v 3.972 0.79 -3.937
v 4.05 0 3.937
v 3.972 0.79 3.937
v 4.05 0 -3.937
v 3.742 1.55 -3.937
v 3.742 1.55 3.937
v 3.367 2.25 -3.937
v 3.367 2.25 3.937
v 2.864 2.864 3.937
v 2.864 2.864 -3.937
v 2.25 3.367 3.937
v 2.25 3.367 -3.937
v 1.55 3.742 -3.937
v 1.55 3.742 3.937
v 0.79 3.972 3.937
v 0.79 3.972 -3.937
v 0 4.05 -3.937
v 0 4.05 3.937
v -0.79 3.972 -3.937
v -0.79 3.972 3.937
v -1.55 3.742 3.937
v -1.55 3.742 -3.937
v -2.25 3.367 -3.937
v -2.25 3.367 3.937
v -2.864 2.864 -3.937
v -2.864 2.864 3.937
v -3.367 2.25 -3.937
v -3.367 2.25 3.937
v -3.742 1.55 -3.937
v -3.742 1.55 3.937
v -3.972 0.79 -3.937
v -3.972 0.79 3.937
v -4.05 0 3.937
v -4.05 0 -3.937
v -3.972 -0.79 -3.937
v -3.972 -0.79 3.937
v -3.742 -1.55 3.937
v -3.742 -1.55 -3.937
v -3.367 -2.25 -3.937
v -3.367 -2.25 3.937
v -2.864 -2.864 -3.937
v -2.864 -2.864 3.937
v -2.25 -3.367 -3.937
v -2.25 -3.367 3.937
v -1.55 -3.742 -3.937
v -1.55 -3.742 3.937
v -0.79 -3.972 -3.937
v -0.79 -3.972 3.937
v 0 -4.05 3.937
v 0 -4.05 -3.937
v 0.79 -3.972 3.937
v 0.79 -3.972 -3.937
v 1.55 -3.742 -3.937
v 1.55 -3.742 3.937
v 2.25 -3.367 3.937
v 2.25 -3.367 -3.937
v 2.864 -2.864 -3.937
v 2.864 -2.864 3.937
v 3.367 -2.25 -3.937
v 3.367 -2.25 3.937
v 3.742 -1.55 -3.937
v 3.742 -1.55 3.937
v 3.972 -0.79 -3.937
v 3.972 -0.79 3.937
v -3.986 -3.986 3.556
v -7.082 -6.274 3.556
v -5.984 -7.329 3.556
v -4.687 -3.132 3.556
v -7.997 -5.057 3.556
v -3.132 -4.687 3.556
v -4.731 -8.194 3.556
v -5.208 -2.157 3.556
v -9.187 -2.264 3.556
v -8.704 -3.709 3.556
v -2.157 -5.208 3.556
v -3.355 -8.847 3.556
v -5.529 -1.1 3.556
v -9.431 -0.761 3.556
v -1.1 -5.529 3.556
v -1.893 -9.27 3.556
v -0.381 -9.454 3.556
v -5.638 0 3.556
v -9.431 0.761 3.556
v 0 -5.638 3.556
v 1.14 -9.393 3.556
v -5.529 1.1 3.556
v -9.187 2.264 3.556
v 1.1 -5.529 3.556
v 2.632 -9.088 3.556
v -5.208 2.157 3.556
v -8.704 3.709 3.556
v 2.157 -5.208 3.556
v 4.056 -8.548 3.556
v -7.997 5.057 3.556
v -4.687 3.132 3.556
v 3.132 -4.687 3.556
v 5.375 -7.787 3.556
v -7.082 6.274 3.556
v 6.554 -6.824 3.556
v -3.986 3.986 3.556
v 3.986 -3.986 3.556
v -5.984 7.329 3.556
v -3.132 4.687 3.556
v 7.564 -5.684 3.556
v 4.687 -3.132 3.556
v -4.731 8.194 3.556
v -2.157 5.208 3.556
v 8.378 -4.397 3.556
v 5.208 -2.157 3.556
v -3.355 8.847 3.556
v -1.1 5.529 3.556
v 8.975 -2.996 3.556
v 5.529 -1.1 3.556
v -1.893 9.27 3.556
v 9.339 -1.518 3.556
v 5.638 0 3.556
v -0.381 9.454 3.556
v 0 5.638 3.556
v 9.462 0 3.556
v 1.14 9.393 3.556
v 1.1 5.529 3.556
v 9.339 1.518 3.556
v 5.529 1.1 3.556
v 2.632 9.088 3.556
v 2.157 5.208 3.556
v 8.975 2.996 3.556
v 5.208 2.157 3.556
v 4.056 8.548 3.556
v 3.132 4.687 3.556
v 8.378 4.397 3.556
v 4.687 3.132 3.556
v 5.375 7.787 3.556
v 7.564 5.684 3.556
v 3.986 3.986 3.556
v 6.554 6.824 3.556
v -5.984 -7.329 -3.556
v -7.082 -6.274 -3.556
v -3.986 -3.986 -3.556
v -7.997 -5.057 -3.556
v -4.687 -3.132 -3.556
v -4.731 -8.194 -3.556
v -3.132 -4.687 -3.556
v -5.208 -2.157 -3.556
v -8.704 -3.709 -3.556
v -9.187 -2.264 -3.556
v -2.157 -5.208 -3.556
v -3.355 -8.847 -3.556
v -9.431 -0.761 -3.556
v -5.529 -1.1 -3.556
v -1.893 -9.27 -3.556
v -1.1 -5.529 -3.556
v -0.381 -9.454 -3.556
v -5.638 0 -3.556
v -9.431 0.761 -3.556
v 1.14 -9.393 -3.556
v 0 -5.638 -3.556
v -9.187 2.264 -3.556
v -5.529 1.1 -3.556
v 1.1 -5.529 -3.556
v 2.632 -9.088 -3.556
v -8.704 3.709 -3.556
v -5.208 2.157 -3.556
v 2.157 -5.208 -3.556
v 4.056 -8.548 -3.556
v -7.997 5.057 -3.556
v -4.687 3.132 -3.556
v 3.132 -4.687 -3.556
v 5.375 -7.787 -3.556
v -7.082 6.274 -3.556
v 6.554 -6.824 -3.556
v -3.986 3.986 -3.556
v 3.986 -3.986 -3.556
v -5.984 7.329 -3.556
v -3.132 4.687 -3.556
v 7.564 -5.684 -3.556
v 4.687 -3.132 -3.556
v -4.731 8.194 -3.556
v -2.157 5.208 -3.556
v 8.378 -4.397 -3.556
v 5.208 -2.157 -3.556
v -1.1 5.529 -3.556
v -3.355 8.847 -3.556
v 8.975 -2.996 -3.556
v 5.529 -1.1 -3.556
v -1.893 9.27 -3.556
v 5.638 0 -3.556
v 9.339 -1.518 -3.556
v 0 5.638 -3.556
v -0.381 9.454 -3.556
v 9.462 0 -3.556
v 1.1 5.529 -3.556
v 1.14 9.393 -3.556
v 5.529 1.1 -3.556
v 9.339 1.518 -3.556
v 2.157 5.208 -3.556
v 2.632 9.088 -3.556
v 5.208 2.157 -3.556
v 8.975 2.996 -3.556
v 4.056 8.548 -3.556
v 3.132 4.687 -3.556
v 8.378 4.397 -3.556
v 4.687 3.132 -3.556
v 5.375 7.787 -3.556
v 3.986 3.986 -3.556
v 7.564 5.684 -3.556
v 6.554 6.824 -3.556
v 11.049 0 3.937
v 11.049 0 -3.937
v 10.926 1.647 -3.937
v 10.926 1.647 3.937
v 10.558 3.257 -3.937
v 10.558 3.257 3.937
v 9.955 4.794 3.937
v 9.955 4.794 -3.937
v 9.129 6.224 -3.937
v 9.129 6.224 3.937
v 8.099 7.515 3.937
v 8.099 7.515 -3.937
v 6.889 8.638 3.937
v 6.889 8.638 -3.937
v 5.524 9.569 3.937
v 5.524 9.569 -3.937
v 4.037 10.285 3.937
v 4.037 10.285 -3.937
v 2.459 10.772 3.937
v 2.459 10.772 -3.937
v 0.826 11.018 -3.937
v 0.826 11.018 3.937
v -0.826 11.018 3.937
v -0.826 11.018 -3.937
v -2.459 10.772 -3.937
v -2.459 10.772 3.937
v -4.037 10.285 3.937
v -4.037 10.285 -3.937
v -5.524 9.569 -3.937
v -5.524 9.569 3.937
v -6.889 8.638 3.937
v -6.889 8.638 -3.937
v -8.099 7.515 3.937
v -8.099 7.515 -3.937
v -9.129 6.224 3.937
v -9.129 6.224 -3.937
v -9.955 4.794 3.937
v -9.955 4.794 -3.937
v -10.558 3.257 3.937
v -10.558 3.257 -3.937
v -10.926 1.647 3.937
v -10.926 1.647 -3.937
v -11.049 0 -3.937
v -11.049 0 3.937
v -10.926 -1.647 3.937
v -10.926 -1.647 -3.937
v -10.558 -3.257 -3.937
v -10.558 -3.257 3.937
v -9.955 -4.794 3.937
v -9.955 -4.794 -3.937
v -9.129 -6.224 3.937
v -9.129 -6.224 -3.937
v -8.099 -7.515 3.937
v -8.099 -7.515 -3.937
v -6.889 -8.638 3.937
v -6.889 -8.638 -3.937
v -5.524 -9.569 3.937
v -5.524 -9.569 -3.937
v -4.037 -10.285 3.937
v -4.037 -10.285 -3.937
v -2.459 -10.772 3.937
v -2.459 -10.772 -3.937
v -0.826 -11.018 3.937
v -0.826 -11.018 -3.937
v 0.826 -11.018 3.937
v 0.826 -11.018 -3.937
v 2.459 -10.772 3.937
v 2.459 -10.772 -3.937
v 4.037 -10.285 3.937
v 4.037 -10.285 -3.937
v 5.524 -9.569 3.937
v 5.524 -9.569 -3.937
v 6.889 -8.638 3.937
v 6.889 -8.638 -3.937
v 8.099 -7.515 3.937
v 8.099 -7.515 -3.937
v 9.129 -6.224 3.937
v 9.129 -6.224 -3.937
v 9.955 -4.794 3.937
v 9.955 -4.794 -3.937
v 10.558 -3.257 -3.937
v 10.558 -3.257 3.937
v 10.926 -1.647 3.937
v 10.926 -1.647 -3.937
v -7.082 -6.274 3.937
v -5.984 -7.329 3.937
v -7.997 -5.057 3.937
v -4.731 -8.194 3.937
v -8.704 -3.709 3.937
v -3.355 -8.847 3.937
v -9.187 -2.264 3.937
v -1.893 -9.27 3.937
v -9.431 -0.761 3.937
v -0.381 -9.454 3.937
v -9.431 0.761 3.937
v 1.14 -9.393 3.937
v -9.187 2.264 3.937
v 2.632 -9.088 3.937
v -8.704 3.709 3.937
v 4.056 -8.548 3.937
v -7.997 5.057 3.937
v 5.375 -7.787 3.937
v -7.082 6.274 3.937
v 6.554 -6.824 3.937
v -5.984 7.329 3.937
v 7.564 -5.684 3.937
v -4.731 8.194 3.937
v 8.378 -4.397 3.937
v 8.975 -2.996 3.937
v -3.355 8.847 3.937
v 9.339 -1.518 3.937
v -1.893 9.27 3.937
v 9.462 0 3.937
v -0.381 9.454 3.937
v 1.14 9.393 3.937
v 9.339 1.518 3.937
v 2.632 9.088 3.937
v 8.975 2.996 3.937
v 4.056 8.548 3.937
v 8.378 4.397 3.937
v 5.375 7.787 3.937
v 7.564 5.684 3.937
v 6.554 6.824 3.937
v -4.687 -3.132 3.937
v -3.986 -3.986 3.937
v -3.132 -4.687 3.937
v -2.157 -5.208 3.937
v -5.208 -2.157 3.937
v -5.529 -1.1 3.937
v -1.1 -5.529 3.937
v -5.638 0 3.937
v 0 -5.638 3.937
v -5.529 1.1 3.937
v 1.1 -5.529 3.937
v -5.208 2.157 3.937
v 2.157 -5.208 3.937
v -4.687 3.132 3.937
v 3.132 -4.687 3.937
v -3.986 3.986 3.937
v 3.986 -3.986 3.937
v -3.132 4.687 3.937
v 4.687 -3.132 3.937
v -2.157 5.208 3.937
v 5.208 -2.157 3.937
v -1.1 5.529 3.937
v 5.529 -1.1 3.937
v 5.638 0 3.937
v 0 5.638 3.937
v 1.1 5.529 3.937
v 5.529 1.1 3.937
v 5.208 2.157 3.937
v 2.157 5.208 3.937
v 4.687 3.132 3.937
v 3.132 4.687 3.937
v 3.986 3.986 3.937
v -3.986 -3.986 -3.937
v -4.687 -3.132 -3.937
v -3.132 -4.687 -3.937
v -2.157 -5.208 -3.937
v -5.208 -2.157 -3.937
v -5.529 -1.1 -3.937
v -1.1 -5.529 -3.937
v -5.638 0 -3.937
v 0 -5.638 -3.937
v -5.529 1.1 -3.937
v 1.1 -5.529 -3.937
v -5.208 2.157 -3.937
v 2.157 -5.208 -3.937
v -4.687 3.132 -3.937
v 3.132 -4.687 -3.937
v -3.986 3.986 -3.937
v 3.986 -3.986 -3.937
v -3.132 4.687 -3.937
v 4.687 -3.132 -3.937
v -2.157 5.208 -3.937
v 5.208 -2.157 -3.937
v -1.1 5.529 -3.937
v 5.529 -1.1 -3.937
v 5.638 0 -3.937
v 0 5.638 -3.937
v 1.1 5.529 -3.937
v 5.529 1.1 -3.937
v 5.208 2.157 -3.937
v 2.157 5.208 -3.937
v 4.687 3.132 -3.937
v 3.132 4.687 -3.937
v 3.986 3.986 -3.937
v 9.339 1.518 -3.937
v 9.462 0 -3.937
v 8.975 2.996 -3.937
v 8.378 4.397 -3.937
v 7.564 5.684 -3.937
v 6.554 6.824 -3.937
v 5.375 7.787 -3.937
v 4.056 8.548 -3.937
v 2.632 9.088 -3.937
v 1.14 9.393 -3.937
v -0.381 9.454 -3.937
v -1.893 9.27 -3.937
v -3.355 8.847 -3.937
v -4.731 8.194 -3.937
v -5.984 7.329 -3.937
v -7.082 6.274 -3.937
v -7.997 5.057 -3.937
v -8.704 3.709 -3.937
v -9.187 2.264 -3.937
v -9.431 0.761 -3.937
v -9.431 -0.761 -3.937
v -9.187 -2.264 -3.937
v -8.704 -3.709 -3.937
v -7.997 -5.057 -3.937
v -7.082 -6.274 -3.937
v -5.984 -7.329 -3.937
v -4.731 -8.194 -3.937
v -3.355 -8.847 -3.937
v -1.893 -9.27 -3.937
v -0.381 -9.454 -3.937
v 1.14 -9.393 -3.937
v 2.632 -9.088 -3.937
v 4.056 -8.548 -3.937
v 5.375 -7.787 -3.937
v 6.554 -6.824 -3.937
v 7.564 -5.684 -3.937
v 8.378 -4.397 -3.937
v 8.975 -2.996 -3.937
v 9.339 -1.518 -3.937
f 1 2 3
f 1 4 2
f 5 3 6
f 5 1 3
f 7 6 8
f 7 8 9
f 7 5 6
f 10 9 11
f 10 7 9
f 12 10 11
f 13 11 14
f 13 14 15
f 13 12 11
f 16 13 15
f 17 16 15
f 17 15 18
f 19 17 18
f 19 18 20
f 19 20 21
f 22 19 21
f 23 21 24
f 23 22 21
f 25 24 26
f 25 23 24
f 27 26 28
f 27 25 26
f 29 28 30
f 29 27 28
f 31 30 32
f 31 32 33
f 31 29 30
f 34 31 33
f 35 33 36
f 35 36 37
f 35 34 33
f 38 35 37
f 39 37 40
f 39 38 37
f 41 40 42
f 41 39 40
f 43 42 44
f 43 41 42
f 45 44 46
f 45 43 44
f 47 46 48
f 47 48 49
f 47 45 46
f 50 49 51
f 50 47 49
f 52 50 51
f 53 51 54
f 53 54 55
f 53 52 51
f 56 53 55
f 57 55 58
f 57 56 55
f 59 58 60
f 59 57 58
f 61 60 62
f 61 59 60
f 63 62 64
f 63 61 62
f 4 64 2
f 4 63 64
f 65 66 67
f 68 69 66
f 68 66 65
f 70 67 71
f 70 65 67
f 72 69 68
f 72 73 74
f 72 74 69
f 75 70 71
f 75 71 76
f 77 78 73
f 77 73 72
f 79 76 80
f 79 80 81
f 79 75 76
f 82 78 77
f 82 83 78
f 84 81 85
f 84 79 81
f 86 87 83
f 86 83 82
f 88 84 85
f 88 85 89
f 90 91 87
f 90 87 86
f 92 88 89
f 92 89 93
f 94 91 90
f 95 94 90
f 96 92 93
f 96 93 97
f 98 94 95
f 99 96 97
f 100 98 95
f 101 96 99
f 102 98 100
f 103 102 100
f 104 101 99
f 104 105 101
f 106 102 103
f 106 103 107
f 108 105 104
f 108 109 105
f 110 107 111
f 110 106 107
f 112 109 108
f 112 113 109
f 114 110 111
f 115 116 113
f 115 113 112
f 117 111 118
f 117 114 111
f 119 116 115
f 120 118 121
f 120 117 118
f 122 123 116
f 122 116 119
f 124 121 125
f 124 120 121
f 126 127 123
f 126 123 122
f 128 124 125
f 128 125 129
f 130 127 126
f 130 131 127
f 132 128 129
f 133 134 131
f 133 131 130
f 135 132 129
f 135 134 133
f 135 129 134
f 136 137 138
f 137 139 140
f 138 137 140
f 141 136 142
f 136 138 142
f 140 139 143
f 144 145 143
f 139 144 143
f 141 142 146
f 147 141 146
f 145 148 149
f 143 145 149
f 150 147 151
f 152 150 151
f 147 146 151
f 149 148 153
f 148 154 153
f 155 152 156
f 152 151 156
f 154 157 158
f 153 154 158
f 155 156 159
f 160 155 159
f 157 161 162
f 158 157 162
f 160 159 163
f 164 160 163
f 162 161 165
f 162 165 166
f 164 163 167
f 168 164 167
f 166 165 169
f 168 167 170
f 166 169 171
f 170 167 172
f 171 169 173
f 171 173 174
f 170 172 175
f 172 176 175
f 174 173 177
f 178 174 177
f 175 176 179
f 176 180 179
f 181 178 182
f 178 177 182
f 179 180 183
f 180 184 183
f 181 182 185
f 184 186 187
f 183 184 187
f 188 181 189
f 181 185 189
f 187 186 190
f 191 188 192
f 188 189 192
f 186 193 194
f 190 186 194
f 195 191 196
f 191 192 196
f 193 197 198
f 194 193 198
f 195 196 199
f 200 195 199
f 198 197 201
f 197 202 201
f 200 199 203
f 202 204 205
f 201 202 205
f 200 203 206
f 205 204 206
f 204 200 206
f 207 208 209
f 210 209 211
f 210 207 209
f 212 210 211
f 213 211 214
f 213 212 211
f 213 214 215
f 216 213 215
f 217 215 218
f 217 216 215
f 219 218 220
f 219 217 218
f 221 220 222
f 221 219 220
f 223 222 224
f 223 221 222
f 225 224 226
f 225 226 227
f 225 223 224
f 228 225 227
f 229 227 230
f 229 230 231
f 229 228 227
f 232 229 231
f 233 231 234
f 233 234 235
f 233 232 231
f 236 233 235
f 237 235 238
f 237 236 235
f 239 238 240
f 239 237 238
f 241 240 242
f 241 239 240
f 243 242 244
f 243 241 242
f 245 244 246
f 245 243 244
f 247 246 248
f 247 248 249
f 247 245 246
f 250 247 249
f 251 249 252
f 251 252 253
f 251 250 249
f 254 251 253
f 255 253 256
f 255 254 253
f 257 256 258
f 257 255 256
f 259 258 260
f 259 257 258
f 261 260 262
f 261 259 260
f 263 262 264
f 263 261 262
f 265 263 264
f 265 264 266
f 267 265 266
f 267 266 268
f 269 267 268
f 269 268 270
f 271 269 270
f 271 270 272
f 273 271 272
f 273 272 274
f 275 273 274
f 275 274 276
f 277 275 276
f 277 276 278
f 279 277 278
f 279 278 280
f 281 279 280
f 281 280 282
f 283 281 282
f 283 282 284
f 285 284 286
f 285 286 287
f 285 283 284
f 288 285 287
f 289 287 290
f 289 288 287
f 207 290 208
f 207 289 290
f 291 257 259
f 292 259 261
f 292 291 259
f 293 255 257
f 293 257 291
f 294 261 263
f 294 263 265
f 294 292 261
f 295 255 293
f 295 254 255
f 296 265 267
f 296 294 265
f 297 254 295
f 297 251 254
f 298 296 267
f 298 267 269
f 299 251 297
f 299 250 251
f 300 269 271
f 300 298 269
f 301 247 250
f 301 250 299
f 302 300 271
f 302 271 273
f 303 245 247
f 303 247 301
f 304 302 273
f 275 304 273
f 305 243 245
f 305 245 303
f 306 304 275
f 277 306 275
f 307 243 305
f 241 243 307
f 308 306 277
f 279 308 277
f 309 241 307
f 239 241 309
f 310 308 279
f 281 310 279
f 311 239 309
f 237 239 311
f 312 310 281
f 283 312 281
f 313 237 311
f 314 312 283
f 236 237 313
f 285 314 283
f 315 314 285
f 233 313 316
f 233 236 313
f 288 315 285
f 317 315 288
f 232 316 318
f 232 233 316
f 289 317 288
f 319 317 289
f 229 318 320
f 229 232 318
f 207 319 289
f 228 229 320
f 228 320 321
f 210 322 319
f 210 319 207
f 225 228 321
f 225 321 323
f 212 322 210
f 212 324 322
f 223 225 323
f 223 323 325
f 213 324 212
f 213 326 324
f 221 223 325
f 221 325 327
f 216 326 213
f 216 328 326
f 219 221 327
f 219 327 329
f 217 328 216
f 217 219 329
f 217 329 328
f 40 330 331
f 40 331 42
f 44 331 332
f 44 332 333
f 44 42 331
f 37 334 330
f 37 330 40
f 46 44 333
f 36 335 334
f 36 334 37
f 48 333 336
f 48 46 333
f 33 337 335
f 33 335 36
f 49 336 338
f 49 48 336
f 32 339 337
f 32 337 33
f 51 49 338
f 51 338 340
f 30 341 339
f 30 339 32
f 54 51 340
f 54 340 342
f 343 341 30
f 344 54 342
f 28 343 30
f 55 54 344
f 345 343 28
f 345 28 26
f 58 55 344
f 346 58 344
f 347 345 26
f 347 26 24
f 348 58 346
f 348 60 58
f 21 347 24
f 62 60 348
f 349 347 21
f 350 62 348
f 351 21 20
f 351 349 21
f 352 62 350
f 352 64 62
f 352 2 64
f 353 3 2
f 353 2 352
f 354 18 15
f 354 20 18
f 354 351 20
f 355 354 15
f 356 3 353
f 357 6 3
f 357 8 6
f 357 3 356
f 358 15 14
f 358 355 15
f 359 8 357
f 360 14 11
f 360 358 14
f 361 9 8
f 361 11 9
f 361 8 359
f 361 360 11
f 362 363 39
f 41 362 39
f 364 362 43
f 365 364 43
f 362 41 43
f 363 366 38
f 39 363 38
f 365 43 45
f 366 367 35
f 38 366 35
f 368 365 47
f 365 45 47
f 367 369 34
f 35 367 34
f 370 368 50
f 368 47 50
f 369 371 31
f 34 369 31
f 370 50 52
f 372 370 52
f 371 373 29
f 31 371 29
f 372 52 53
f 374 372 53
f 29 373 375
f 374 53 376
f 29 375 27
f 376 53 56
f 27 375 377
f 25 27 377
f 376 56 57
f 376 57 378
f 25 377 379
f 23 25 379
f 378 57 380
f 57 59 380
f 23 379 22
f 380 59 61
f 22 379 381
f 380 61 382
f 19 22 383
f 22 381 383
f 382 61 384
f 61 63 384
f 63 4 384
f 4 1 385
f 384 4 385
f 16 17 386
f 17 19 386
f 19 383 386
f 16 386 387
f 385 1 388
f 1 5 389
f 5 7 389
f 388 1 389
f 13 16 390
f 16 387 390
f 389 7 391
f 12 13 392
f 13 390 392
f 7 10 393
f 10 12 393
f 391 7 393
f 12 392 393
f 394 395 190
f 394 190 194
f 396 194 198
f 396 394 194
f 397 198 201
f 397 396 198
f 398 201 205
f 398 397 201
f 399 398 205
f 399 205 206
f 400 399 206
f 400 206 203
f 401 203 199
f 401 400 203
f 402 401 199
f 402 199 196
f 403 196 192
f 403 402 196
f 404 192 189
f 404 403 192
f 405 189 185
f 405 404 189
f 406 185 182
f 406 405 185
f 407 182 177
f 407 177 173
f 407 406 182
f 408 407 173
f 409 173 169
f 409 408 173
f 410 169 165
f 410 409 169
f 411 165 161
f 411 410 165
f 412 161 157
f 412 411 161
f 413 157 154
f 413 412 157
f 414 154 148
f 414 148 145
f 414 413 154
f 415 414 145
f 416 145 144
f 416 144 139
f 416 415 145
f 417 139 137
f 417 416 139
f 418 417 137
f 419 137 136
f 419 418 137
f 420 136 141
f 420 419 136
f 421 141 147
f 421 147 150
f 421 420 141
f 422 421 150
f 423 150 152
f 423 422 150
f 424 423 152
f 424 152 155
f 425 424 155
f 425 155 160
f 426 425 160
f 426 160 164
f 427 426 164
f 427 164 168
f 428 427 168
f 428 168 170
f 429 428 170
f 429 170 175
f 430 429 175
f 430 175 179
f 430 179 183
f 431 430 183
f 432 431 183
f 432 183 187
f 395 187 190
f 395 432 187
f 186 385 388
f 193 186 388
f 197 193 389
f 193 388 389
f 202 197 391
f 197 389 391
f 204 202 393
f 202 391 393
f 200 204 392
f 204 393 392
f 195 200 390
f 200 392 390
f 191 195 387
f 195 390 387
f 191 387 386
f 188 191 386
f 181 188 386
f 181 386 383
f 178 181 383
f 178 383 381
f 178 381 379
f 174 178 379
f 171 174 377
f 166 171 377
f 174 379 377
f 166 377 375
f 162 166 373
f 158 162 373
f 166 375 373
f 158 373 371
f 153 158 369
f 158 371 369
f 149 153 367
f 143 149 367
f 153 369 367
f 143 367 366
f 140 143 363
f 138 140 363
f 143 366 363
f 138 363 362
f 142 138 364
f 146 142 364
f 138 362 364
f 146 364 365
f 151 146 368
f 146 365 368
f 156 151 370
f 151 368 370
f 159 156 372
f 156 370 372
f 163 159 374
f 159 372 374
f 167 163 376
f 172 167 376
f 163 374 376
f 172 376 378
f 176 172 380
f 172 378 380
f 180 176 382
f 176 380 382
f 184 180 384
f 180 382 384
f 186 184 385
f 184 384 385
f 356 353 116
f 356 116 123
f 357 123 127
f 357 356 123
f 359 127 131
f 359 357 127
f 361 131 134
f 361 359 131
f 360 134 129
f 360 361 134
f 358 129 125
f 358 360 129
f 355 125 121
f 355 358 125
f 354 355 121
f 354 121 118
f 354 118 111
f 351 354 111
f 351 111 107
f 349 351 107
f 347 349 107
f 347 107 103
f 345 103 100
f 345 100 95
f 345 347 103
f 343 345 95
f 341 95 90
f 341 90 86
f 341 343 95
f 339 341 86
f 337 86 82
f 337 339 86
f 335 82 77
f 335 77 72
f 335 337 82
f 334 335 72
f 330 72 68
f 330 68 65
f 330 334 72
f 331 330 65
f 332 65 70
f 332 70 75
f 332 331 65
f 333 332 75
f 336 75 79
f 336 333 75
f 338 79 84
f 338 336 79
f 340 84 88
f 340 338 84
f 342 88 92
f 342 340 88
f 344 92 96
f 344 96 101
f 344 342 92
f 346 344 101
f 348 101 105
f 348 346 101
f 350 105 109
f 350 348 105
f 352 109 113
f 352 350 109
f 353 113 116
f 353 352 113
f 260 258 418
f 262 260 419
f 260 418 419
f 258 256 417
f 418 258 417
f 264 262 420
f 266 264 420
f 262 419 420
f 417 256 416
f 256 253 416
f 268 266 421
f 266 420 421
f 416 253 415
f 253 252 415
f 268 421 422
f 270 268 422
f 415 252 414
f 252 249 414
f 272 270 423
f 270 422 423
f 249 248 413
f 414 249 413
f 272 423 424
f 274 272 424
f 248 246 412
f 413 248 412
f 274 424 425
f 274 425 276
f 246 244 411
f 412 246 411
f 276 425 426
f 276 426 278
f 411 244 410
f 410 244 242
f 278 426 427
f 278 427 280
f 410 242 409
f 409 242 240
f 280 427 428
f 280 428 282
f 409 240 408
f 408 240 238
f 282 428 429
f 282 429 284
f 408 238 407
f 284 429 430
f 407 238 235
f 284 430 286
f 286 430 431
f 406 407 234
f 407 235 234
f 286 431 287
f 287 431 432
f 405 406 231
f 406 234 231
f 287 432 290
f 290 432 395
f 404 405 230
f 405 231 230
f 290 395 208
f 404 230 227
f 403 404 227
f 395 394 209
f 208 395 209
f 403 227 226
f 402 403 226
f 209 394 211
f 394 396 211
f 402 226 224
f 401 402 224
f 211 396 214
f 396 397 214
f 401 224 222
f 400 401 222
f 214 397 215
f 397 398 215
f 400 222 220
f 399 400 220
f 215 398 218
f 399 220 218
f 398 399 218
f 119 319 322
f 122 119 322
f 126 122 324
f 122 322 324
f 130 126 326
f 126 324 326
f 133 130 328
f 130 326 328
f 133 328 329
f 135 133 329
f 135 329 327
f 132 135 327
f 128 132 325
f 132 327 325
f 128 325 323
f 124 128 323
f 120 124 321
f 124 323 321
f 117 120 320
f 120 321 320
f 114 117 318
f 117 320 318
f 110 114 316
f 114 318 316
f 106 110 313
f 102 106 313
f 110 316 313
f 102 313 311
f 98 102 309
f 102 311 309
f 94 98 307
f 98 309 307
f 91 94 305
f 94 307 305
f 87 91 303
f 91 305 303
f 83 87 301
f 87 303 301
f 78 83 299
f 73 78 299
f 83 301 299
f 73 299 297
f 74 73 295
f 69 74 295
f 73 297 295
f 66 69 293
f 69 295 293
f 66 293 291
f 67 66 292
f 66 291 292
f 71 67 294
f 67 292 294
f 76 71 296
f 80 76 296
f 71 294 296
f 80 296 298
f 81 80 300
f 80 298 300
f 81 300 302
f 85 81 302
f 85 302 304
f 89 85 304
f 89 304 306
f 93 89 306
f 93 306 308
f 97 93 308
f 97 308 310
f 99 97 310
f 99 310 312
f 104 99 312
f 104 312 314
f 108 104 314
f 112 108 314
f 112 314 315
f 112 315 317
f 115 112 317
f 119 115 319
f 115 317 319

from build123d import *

# Parameters (mm, degrees)
SKETCH1_R           = 11.049
SKETCH1_R_2         = 4.05
BOSS_EXTRUDE1_DEPTH = 3.937
SKETCH2_R           = 9.4615
SKETCH2_R_2         = 5.6375
CUT_EXTRUDE1_DEPTH  = 0.381


with BuildPart() as part:
    # Sketch1 → Boss-Extrude1 (new body, symmetric)
    with BuildSketch(Plane.XY):
        Circle(SKETCH1_R)
        Circle(SKETCH1_R_2, mode=Mode.SUBTRACT)
    extrude(amount=BOSS_EXTRUDE1_DEPTH, both=True)

    # Sketch2 → Cut-Extrude1 (cut)
    with BuildSketch(Plane.XY.offset(3.937)):
        Circle(SKETCH2_R)
        Circle(SKETCH2_R_2, mode=Mode.SUBTRACT)
    cut_extrude1 = extrude(amount=-CUT_EXTRUDE1_DEPTH, mode=Mode.SUBTRACT)

    # Mirror1: Cut-Extrude1 across plane
    add(cut_extrude1.mirror(Plane.XY), mode=Mode.SUBTRACT)


solid = part.part
